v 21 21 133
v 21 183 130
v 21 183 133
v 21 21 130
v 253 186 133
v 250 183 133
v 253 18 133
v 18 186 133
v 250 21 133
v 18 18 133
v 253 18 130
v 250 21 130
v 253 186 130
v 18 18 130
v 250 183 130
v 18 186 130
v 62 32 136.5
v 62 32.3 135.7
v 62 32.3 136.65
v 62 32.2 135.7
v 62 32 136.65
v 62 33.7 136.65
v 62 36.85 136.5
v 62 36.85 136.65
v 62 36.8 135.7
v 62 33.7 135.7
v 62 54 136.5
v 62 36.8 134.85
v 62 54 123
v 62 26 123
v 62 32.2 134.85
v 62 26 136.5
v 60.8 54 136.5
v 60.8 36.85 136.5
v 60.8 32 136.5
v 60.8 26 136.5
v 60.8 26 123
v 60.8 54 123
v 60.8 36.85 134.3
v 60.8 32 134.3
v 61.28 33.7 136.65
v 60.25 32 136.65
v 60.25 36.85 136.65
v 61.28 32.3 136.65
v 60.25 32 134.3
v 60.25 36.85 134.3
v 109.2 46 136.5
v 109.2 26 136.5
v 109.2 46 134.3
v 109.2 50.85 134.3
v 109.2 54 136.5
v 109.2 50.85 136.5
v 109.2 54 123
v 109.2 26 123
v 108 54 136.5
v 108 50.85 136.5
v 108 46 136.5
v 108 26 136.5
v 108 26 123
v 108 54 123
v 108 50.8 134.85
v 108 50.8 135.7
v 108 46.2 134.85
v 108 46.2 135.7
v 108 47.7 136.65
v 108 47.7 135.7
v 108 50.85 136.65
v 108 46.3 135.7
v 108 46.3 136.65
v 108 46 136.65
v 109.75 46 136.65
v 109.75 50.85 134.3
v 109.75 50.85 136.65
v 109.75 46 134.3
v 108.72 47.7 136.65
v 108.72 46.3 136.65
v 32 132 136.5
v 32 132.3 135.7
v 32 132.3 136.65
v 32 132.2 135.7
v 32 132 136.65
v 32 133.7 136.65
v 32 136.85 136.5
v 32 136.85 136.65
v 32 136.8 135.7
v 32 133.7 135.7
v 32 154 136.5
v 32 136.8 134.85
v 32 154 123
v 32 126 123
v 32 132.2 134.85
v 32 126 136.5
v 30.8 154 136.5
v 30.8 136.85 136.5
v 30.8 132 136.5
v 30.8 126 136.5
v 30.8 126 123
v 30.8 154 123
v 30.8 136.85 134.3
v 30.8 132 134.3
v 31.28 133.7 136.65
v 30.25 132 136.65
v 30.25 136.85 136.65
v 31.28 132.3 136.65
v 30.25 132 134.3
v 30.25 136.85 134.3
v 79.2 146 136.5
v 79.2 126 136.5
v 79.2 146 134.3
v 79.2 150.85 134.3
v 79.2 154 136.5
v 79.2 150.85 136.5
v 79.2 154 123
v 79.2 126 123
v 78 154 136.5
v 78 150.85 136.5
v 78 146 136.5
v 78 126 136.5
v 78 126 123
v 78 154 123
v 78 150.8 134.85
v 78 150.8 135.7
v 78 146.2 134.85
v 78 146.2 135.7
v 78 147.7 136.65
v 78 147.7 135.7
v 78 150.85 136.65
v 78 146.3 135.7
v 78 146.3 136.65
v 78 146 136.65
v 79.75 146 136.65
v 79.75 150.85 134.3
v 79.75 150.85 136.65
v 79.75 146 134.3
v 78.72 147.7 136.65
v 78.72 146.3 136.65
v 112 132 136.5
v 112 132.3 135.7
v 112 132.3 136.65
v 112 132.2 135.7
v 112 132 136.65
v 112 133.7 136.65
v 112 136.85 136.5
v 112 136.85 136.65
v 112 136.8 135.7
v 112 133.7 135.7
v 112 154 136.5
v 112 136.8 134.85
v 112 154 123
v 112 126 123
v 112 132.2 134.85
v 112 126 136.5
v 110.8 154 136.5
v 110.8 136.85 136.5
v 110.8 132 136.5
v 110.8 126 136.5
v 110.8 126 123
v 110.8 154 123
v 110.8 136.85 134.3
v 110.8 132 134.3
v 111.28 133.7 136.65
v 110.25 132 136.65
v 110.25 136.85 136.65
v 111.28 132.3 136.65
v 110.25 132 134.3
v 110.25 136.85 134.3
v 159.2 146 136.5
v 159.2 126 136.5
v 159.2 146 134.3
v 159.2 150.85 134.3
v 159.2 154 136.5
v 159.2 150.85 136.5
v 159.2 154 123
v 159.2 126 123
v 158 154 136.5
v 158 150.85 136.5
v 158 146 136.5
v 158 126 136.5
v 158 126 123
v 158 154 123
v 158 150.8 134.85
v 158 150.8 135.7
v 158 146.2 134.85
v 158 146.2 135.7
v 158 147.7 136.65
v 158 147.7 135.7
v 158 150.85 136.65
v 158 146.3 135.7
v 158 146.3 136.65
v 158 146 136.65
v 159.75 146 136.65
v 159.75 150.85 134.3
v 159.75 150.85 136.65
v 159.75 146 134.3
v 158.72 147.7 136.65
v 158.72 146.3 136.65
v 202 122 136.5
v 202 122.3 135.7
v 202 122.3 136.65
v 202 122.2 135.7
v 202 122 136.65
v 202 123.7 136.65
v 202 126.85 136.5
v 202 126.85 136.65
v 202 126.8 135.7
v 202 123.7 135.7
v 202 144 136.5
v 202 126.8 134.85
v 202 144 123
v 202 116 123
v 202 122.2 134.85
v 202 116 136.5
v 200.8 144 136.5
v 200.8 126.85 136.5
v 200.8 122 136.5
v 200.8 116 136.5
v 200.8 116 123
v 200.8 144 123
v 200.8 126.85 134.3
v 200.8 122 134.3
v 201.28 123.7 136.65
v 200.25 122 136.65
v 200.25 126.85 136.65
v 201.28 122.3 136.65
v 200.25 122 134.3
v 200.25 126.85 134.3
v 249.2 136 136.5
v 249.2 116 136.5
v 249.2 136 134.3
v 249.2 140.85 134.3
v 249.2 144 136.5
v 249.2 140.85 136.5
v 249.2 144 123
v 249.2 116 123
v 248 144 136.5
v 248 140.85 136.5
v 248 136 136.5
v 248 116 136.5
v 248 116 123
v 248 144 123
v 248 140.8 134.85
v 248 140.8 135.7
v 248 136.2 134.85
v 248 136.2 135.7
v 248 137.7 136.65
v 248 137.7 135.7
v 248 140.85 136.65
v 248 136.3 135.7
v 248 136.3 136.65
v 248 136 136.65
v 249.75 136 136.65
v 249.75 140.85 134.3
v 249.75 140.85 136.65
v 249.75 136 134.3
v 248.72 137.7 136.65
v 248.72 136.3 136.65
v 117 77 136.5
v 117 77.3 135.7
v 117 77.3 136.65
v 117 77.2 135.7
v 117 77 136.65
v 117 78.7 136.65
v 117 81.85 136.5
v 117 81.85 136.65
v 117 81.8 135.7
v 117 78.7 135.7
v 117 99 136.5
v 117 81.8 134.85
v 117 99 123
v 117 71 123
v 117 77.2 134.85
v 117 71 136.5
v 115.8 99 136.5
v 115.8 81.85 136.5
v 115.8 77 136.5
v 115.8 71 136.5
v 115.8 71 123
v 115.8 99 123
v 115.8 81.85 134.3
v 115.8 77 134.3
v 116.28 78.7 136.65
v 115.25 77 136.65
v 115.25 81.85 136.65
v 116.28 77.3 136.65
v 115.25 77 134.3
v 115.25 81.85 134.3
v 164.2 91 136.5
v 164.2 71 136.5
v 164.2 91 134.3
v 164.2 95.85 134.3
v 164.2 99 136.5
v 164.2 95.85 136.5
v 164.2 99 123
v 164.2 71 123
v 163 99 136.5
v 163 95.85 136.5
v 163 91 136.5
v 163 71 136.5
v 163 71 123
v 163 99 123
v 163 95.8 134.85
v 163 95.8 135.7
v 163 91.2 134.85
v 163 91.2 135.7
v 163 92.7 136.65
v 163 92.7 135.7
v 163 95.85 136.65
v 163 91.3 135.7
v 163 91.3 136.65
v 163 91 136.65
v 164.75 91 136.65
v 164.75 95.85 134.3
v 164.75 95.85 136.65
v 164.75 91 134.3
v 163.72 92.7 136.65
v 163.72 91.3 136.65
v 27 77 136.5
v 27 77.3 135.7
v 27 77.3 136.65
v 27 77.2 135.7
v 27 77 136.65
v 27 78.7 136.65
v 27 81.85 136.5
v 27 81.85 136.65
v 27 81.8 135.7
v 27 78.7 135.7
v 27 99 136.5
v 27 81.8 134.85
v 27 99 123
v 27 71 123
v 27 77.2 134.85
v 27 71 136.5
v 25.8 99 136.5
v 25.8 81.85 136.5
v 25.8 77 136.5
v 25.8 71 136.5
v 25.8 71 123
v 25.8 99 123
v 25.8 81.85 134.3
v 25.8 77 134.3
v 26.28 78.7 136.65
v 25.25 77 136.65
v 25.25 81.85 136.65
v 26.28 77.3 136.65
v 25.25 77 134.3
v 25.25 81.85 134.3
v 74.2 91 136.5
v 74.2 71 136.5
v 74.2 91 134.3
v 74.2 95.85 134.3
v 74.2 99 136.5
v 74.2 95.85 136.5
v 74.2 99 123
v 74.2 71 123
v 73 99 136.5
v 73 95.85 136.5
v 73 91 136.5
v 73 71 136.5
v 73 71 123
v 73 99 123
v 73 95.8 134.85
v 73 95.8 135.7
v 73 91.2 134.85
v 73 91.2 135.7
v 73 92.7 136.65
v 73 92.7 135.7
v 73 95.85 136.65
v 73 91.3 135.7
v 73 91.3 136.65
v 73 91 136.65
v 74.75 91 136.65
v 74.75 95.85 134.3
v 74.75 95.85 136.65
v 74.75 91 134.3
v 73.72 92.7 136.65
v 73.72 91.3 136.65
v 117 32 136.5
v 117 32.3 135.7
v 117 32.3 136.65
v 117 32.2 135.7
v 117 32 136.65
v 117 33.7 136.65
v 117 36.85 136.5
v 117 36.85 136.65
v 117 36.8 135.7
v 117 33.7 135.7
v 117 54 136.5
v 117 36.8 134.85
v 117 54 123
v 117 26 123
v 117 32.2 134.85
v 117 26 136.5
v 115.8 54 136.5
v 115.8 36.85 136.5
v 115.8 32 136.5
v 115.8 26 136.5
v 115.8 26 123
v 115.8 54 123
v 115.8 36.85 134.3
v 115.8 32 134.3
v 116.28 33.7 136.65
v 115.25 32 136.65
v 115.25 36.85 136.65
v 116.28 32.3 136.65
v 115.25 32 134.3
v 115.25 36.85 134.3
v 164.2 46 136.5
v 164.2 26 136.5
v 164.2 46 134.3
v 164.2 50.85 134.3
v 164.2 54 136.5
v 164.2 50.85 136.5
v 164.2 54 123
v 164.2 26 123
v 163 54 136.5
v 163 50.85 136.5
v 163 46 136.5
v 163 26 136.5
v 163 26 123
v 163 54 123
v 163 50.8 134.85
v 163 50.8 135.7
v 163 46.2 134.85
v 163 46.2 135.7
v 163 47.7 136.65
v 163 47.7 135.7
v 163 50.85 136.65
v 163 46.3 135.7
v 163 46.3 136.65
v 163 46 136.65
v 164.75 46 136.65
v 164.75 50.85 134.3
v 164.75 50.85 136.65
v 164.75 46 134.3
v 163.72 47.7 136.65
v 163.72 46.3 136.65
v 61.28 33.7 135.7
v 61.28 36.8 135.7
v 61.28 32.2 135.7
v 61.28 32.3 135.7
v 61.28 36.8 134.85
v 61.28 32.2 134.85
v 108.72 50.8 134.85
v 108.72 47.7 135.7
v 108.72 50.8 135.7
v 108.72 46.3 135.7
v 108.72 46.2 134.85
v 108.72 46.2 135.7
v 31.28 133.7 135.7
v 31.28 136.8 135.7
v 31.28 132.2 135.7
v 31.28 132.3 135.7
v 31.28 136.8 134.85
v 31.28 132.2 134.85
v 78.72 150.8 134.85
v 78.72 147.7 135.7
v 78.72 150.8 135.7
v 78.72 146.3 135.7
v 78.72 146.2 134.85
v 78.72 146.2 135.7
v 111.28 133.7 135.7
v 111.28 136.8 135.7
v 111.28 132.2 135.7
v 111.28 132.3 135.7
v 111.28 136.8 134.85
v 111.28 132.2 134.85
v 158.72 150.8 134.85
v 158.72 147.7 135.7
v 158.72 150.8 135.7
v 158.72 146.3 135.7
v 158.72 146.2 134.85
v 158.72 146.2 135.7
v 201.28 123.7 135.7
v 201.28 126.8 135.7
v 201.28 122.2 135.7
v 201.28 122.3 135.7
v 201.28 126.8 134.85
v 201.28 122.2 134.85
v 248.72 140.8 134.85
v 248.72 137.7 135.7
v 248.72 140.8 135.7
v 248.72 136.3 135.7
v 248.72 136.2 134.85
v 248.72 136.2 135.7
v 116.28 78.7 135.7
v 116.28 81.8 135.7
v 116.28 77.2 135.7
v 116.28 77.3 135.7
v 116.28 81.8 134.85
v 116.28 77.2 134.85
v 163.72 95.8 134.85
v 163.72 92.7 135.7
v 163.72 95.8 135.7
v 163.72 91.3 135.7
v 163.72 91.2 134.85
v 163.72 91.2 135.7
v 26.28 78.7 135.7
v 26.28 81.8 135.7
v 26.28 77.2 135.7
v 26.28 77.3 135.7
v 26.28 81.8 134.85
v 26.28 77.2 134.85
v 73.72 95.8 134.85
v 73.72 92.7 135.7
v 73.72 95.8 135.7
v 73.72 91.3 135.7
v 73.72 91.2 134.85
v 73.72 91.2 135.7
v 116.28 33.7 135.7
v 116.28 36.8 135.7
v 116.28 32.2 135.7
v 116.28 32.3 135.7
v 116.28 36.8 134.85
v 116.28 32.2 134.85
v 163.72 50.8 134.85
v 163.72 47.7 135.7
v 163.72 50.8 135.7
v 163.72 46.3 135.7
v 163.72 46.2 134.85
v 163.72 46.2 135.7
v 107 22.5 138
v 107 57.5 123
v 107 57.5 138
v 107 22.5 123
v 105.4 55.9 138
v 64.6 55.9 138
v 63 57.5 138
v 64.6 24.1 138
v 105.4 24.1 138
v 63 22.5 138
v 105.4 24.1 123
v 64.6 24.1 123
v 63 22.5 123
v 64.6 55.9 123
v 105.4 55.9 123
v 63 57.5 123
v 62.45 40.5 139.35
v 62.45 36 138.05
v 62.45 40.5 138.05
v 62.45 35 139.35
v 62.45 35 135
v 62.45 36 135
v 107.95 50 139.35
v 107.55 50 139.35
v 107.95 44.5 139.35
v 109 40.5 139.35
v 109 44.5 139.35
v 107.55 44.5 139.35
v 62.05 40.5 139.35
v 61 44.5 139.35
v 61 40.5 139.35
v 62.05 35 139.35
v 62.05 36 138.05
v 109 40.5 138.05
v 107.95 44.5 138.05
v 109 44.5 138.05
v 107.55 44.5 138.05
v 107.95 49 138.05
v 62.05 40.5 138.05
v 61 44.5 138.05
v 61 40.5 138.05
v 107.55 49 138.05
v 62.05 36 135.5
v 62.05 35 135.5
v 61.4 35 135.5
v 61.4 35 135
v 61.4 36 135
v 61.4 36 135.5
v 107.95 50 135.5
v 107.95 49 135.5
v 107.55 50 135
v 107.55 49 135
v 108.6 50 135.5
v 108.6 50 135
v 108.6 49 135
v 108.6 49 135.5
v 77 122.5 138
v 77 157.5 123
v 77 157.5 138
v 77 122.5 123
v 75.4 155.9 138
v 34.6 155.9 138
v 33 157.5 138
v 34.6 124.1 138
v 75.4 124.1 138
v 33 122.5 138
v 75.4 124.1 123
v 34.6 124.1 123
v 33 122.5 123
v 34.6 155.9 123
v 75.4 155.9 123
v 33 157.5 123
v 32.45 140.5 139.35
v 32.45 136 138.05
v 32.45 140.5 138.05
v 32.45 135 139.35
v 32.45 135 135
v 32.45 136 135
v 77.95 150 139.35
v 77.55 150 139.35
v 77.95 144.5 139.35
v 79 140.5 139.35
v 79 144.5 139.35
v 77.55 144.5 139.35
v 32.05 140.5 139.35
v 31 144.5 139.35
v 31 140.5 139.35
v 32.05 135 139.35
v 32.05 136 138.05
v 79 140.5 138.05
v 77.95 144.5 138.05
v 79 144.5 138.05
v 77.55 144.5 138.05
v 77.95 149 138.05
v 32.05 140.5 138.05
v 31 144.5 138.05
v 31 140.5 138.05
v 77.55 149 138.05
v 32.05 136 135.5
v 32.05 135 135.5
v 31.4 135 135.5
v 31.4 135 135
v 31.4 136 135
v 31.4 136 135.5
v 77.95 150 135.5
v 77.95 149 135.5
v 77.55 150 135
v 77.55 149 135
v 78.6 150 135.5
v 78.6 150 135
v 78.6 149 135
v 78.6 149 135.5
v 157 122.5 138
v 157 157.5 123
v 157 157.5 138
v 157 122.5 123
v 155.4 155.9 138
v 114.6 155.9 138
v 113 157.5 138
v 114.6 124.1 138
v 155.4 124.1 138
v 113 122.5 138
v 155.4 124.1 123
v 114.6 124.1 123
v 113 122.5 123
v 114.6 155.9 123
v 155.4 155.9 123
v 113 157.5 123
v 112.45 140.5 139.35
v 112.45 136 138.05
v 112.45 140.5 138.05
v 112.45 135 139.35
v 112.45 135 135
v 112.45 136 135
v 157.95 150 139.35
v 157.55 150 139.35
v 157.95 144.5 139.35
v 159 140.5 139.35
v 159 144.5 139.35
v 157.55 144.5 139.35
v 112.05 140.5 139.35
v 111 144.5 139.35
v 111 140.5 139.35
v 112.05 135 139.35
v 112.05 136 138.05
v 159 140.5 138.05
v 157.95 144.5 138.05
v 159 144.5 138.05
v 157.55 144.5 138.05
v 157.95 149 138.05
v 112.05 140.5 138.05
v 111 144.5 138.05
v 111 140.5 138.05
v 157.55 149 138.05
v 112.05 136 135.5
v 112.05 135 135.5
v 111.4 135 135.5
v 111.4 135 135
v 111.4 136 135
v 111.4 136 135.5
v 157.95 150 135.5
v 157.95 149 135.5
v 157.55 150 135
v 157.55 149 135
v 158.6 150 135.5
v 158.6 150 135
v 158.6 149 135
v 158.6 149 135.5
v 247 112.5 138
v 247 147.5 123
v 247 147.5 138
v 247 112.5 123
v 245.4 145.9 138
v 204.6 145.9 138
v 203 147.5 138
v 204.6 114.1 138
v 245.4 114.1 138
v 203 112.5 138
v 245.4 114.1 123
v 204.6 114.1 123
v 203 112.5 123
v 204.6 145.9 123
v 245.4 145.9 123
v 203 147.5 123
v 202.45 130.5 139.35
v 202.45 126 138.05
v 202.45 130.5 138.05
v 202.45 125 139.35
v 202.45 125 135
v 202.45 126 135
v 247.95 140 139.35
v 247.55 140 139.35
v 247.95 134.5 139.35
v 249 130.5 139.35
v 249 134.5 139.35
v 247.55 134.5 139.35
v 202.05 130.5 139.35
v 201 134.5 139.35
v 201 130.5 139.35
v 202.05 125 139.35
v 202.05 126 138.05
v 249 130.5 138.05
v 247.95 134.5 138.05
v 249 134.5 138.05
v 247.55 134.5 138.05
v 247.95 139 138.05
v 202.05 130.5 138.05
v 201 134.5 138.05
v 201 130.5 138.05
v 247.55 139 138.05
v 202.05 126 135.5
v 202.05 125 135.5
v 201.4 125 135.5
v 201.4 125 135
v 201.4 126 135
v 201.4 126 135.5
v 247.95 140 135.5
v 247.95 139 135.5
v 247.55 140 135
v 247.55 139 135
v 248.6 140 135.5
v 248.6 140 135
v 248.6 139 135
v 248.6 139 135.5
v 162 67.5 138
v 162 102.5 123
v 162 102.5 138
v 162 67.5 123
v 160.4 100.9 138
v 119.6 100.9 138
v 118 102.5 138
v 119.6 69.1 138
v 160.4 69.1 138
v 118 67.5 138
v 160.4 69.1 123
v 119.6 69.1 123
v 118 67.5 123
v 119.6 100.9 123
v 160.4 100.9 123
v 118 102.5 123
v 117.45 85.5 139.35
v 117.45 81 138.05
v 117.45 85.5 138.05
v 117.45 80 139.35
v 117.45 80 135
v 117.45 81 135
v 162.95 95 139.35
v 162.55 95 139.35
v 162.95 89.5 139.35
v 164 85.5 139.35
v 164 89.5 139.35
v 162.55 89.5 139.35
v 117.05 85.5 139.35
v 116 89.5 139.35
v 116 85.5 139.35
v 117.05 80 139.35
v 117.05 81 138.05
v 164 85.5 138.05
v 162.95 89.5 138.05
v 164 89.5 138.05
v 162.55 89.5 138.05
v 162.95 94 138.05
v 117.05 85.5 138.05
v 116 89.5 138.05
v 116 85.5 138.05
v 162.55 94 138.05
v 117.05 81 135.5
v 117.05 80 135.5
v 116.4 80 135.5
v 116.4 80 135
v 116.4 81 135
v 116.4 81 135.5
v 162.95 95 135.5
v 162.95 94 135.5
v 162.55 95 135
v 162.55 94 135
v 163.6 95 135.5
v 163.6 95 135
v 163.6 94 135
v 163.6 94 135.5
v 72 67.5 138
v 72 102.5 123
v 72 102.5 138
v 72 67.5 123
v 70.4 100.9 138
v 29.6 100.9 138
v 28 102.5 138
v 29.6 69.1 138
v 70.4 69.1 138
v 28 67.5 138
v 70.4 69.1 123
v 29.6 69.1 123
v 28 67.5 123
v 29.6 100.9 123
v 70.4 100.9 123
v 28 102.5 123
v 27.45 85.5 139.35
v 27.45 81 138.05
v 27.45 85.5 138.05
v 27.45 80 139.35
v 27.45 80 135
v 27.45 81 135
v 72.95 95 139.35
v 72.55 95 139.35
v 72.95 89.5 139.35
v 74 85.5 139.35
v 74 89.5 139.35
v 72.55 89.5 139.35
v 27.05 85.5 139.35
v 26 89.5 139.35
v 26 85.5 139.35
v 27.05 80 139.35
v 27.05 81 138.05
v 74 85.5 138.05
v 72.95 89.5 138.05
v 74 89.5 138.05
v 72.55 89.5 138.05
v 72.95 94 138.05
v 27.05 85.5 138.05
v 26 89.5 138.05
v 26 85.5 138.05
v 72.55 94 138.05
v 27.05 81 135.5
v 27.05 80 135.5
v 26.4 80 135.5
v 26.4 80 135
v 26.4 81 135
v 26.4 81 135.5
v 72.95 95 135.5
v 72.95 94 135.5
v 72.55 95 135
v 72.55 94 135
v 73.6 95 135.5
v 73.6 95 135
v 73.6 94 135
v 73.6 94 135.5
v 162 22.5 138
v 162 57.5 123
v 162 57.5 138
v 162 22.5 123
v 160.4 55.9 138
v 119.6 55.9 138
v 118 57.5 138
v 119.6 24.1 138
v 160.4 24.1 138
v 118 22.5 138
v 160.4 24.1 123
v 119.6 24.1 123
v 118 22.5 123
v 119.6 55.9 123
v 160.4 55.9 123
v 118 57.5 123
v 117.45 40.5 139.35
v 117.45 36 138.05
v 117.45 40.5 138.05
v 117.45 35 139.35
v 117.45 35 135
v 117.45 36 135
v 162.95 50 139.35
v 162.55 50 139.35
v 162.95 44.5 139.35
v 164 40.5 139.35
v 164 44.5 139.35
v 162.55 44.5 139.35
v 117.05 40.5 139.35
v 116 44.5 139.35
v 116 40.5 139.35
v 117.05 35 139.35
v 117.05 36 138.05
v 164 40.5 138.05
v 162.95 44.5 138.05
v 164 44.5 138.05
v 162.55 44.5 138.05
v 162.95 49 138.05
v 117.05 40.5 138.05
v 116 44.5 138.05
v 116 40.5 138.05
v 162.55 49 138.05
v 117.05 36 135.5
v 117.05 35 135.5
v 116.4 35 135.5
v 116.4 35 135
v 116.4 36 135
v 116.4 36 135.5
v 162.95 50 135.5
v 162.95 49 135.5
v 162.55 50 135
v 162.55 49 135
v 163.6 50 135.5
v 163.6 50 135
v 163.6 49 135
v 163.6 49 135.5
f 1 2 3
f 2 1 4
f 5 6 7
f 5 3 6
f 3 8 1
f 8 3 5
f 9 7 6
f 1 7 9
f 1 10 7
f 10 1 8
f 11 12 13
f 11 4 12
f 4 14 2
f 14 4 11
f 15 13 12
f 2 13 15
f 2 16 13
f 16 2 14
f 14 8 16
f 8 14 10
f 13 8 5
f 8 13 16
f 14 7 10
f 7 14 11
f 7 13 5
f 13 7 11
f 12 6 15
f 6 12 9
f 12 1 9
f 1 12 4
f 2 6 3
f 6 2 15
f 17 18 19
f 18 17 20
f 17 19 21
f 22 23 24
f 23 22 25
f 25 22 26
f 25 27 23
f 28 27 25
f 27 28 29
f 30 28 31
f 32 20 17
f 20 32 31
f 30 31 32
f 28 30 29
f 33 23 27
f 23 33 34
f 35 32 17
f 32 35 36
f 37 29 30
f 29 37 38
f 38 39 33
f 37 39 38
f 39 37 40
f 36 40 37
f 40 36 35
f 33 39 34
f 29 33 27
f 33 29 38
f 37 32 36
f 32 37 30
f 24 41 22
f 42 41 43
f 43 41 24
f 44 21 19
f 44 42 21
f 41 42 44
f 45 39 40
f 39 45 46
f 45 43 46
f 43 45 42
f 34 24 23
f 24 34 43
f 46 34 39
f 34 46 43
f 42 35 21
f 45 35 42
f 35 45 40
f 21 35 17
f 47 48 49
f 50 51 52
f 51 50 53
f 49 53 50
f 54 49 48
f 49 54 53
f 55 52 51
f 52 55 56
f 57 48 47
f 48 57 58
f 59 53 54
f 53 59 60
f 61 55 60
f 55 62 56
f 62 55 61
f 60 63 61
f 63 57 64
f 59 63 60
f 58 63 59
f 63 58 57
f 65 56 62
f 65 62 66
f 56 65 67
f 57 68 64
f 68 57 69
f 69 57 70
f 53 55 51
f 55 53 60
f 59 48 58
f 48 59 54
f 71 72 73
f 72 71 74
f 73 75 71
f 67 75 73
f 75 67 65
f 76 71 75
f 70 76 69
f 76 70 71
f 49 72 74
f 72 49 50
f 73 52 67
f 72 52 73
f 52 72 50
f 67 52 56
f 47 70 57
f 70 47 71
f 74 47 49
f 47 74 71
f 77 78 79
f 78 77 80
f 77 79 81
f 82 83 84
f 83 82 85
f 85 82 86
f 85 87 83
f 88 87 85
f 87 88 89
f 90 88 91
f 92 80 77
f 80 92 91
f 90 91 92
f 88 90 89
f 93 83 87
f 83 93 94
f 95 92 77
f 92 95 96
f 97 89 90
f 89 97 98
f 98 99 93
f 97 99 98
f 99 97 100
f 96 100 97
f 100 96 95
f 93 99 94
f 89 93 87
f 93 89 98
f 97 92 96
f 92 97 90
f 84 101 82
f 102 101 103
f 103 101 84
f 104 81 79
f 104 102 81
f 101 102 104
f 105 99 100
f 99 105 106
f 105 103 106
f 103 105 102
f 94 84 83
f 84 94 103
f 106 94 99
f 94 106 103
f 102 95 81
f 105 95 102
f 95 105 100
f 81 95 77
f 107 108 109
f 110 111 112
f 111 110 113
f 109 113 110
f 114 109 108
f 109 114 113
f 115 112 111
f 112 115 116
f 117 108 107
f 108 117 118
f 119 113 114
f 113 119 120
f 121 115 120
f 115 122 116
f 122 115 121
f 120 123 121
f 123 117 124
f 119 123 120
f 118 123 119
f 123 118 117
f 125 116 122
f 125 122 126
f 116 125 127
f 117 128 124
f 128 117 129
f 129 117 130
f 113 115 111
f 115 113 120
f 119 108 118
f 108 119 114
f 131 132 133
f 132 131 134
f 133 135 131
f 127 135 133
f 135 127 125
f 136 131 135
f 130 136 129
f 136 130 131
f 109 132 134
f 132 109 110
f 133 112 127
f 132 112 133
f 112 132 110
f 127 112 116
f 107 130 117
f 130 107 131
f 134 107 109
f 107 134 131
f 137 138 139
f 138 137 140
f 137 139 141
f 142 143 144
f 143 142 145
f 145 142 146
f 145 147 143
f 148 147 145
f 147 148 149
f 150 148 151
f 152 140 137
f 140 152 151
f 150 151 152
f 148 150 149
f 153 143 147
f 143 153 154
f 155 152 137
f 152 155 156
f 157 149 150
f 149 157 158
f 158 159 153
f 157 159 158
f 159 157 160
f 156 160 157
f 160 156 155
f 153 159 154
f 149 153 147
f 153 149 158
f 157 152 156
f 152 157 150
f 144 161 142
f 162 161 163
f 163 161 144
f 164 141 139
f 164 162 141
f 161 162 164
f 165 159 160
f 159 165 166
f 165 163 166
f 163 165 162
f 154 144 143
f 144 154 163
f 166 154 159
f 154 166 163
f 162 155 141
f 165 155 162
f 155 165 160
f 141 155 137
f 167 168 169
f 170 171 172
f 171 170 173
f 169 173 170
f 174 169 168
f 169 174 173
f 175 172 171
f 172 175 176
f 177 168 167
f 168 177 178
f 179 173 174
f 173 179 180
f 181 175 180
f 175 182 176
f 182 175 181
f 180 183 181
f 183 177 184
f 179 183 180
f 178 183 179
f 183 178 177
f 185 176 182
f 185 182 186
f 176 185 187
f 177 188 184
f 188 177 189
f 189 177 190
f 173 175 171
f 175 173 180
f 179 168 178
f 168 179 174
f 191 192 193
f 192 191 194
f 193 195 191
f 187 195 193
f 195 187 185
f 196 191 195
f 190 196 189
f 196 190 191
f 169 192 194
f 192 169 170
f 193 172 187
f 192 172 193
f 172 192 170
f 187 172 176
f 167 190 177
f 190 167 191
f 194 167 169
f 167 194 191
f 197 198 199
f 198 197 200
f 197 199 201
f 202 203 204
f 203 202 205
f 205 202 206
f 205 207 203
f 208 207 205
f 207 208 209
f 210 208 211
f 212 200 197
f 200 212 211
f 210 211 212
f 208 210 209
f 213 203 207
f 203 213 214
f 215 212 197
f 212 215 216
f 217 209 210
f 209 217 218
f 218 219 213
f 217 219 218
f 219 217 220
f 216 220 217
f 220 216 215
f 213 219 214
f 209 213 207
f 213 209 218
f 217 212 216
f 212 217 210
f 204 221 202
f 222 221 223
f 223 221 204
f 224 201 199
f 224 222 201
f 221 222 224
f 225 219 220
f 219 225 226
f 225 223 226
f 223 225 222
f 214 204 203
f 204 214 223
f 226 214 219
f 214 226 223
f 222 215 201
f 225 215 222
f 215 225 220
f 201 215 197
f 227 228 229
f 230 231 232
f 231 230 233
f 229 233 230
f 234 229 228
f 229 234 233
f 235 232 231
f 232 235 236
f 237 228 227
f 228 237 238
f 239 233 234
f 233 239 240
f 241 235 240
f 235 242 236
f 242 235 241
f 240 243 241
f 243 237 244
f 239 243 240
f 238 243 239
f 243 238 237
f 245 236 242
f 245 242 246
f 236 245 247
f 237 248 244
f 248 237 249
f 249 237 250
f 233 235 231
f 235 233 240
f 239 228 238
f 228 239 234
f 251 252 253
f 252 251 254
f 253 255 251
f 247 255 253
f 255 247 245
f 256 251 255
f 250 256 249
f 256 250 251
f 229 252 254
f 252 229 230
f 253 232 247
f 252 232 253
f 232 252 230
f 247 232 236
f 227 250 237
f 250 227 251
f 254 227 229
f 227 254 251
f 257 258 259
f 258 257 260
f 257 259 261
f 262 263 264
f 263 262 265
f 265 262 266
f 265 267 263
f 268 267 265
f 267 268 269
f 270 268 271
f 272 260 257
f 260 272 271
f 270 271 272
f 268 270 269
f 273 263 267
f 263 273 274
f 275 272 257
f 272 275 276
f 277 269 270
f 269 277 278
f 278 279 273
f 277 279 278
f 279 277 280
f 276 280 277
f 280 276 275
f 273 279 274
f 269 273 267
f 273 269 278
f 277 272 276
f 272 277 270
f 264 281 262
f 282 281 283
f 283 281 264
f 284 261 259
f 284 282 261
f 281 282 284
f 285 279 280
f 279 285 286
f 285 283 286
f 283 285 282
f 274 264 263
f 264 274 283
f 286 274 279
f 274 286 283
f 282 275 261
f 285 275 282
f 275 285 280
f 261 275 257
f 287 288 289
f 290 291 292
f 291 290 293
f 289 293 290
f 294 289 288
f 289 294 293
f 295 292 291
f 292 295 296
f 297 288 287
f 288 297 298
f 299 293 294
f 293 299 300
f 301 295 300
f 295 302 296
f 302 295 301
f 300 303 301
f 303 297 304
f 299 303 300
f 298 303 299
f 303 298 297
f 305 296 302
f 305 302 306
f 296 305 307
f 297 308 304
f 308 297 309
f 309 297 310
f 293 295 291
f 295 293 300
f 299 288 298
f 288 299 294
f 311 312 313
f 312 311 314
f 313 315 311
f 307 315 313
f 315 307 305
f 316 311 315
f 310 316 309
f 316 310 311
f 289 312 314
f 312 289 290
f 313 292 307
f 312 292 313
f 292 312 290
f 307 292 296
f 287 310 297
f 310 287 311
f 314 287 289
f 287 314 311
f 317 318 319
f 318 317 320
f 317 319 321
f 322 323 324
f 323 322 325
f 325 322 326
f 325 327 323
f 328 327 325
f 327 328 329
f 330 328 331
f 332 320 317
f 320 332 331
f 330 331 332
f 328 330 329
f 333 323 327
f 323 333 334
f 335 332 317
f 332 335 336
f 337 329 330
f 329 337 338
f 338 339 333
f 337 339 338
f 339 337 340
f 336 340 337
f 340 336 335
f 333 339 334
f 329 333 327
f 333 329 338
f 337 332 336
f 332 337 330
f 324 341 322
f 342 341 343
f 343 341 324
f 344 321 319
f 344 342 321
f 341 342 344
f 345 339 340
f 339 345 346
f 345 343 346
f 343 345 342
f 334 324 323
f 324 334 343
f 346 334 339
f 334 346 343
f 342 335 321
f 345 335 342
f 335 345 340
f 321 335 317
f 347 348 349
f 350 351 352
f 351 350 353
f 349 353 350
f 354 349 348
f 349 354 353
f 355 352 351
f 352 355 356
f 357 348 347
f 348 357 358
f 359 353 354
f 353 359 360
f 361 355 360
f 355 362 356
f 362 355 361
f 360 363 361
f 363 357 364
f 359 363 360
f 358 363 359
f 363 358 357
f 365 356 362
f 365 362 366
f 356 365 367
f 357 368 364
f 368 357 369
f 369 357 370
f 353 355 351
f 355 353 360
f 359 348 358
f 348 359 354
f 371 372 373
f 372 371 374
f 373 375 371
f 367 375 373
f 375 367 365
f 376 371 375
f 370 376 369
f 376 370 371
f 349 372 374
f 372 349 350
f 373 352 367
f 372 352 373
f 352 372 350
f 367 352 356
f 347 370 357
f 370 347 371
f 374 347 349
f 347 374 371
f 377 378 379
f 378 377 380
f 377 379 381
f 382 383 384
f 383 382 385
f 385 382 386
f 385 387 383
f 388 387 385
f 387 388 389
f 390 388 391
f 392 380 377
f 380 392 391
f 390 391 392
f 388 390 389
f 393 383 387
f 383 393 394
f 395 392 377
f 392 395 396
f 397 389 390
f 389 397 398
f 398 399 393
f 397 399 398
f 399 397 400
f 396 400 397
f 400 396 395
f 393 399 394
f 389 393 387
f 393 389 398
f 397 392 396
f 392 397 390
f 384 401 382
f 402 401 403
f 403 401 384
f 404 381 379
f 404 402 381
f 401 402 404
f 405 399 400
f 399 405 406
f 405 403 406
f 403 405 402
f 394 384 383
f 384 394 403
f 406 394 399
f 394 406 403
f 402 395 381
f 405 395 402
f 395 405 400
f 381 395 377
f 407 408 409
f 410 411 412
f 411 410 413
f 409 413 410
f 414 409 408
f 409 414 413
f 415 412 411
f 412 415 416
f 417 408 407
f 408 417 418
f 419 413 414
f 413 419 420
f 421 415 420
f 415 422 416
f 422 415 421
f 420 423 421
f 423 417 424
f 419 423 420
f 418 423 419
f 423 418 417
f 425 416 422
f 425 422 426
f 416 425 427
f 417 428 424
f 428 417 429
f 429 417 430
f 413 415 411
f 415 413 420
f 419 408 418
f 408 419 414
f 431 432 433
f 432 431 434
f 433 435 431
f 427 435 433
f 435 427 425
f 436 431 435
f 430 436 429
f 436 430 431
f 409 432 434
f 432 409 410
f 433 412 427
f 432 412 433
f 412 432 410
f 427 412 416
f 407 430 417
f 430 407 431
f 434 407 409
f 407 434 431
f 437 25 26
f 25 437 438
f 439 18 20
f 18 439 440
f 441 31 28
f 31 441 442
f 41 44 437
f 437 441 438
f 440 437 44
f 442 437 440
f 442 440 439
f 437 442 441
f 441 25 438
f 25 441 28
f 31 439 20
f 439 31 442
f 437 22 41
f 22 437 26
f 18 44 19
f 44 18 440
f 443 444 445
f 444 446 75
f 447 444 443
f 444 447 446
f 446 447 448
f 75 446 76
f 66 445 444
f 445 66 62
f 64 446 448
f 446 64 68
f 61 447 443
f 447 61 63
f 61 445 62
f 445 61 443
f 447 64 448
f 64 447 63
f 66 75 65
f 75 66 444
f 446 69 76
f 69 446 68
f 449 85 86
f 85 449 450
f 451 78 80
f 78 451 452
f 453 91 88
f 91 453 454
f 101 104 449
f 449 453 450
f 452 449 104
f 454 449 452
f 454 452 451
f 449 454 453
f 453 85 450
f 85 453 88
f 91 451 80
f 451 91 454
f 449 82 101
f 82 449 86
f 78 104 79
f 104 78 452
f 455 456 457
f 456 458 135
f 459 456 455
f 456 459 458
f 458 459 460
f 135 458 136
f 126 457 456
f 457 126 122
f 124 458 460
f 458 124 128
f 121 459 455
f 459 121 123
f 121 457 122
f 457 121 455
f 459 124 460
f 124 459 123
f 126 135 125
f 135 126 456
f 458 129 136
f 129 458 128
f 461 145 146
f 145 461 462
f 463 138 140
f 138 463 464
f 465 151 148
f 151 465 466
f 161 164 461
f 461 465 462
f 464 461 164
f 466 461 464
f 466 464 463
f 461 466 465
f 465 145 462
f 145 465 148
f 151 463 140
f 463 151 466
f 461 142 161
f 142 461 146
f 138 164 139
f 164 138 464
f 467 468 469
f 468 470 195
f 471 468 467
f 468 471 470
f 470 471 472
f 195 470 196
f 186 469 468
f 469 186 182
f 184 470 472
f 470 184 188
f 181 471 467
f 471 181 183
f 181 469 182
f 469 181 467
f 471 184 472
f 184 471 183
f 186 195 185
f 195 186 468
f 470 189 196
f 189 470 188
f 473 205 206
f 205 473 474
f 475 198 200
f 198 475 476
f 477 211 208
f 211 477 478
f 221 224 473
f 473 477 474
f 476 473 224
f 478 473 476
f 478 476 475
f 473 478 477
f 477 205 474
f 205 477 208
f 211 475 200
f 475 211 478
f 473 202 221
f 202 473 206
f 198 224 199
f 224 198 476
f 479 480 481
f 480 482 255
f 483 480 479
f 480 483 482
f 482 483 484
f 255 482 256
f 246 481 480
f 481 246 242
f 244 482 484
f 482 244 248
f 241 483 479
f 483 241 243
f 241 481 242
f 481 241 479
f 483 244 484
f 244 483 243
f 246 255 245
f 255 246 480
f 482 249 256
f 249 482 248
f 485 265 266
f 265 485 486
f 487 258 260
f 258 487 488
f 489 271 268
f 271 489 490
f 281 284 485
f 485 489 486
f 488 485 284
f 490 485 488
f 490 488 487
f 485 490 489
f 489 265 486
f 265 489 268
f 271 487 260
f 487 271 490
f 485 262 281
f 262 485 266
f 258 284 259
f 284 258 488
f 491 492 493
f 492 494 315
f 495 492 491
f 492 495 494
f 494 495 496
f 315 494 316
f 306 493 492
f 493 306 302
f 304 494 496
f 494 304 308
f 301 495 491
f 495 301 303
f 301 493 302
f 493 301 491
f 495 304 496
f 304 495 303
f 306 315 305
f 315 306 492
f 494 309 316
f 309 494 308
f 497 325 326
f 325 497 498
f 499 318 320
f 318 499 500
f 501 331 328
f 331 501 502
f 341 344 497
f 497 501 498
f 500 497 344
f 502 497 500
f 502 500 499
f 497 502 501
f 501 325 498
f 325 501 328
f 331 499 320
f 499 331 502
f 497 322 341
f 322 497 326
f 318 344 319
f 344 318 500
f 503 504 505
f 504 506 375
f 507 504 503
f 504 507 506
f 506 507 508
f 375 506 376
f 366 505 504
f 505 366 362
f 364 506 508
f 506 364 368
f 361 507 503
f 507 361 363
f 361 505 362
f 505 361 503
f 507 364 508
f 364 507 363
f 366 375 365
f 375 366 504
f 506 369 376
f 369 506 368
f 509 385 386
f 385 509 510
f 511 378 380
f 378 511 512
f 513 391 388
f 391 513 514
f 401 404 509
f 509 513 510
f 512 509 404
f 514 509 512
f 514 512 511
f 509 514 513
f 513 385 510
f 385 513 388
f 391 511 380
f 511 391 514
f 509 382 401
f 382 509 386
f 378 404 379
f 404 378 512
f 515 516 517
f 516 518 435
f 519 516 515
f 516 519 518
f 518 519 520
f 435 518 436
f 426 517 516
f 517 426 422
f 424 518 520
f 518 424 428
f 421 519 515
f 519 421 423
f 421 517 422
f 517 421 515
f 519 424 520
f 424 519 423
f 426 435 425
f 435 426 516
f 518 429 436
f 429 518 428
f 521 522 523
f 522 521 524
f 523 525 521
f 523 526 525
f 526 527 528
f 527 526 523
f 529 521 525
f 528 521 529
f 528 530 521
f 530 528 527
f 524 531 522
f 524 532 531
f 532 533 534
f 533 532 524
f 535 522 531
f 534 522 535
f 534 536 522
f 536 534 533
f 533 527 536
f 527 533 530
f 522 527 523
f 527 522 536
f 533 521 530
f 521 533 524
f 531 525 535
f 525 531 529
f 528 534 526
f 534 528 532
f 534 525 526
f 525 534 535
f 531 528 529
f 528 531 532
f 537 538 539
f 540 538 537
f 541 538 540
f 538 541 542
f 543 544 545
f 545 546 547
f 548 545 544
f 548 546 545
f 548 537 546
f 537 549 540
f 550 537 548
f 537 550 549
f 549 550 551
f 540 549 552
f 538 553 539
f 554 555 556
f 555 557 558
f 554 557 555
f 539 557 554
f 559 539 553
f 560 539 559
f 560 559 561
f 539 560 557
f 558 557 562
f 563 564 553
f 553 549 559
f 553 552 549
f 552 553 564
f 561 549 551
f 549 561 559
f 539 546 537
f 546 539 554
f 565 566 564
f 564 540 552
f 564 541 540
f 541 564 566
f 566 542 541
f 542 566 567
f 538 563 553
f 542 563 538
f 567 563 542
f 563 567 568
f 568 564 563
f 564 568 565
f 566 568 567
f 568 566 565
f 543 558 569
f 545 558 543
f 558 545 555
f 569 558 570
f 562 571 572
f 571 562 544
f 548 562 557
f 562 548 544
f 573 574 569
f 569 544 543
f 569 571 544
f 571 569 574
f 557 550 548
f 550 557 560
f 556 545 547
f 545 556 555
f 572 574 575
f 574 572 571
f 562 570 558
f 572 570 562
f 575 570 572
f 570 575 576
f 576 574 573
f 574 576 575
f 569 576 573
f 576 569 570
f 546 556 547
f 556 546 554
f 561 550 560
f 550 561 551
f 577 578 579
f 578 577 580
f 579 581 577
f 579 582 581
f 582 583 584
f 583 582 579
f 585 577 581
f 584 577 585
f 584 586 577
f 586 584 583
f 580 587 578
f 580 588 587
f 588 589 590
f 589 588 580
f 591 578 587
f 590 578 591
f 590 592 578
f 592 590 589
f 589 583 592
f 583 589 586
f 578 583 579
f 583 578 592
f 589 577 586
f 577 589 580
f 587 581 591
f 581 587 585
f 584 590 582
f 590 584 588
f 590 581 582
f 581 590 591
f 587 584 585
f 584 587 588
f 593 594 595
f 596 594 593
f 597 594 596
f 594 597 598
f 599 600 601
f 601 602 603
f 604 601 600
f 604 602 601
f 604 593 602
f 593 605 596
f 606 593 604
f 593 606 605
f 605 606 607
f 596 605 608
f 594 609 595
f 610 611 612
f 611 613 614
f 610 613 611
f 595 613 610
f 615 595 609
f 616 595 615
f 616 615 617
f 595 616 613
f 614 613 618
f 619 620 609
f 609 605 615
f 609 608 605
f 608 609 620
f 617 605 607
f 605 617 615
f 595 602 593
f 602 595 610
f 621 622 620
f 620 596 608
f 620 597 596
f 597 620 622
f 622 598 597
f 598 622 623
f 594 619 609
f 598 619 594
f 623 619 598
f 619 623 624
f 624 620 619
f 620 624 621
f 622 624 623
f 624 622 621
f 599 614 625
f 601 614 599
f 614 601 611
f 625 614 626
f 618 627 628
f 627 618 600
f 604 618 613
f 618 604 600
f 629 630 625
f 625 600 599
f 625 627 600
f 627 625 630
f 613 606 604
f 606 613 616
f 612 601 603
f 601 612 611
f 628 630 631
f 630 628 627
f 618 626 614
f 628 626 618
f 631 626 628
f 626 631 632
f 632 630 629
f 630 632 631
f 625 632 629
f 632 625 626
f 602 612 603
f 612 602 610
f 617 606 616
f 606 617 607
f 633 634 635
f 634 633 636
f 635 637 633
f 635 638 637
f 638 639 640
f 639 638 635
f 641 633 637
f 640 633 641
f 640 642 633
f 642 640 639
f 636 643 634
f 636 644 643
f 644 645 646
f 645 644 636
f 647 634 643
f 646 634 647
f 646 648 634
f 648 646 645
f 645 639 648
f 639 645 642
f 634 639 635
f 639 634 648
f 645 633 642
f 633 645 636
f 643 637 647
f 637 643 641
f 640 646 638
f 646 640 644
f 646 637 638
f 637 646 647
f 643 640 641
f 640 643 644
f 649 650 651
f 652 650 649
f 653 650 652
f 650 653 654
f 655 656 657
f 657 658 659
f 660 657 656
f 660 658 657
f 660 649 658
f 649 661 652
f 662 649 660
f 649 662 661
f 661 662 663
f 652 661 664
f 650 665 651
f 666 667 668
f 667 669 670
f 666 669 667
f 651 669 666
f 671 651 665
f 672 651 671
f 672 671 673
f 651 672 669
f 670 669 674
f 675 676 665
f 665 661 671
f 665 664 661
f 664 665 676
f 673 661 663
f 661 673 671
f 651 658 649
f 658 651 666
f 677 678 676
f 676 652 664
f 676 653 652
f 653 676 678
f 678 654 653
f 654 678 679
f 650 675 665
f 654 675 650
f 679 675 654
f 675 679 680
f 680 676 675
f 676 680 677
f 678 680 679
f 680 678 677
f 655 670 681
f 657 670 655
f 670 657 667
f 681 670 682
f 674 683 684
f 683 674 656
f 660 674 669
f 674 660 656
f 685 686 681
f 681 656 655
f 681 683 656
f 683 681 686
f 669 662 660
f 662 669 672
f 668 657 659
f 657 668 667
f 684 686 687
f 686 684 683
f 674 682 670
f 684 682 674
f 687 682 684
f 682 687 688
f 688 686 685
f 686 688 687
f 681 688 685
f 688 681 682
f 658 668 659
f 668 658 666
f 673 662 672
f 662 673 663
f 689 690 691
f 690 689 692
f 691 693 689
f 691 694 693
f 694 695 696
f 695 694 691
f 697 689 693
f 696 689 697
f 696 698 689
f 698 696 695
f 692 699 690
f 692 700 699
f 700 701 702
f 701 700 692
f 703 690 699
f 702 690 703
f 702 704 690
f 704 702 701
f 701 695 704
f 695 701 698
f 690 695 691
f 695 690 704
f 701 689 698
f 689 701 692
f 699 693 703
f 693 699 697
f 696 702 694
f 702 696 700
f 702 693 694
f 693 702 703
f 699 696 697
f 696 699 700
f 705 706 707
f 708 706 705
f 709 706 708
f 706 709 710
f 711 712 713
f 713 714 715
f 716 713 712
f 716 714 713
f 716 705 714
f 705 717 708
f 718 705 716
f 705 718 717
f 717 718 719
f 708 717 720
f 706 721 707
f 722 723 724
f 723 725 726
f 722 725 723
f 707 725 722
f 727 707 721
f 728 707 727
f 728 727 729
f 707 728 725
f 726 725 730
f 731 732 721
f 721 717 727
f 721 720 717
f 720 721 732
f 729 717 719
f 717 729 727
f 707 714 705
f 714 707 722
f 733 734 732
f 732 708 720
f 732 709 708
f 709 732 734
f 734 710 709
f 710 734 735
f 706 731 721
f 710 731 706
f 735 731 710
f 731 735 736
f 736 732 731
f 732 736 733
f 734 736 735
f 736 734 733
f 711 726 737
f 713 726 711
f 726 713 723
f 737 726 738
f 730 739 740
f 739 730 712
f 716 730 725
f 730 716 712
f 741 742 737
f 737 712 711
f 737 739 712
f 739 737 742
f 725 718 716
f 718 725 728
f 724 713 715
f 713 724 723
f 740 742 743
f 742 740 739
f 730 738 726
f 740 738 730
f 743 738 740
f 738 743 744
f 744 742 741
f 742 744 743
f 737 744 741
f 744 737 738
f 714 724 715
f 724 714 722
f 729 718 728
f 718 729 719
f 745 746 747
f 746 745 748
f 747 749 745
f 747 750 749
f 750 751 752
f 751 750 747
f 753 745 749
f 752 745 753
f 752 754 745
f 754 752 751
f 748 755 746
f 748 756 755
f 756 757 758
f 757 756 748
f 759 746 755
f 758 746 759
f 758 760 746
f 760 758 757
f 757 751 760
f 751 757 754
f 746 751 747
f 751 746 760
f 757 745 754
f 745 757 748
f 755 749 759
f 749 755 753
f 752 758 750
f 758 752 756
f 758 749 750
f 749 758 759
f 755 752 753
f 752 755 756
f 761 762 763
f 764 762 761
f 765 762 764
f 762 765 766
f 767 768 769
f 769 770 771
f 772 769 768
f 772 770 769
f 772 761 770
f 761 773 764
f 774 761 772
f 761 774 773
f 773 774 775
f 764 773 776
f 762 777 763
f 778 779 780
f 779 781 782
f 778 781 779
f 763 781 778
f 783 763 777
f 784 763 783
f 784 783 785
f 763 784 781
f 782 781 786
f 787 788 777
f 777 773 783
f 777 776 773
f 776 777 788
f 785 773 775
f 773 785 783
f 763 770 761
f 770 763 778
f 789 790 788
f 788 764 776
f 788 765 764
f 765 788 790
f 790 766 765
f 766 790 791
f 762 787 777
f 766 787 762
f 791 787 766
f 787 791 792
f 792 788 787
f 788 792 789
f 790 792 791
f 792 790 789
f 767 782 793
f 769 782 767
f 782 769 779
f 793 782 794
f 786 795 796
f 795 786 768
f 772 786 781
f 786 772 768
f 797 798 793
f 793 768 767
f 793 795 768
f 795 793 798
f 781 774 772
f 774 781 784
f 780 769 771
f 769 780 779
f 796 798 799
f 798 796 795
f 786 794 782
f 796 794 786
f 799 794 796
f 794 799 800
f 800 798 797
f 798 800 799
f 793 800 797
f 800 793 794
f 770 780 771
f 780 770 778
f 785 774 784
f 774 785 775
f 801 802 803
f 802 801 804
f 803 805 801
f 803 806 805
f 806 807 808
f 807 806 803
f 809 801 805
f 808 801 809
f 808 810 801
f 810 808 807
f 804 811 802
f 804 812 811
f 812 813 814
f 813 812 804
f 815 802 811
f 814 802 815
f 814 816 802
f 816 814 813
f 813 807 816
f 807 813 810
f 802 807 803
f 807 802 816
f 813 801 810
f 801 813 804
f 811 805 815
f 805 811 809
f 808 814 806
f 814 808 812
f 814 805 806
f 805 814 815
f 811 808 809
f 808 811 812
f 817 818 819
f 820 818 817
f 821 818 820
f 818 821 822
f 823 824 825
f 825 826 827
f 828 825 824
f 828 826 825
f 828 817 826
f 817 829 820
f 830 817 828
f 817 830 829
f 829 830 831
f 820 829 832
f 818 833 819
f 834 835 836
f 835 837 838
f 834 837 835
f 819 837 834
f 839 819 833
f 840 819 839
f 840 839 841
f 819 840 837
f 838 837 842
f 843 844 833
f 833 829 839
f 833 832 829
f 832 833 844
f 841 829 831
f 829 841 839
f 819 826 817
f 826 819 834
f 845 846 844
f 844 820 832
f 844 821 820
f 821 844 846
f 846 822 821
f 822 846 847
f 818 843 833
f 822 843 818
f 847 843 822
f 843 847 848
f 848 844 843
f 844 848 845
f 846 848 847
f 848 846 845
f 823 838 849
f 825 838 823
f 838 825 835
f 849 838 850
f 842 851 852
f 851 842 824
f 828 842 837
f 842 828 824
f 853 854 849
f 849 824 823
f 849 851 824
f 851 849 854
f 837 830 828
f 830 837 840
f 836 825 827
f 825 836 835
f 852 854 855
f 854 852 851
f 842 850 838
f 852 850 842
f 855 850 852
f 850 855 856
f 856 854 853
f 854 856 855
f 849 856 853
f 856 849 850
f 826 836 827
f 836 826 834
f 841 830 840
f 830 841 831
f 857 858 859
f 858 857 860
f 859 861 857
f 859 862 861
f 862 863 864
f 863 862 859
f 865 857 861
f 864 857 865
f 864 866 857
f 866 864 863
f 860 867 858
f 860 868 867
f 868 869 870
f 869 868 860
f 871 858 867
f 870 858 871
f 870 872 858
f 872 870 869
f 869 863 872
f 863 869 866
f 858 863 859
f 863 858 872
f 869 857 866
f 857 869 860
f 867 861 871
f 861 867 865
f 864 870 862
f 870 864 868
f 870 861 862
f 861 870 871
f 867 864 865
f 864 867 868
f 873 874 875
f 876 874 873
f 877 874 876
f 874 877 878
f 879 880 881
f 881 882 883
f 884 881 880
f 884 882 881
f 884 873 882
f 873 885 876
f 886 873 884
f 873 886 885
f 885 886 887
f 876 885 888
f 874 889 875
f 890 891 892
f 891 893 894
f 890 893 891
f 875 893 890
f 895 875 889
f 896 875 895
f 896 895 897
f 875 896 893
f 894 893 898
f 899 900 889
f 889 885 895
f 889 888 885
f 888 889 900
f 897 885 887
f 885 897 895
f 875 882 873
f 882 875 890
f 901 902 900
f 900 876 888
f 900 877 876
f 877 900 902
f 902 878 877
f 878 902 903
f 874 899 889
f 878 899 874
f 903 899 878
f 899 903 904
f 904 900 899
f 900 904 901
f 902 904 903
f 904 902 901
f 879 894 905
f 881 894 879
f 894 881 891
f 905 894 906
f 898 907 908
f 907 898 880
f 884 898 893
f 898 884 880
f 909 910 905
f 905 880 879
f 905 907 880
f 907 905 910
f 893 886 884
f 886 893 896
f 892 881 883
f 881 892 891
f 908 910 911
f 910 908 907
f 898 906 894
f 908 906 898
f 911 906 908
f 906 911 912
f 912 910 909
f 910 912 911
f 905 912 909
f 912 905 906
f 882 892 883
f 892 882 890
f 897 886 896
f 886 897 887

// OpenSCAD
// D7 seven-axis nominal matched guide/rigid-bayonet proof of concept.
// DESIGN REVIEW, NOT APPROVED HARDWARE. 14 guide lips, 14 keys.
// Does NOT include independently load-certified bracket anchors, other D7 solids, real motor PCBs or 14 webs.
// Source 1774 solid SHA256 20ee6d8c001ee16d64e47edb5456eff3bc39f3390a85dd94b69b7eb1504d878f.
// Lock state: "entry" for insertion, "locked" after +Y2.5mm. REVERSE UNINTENDED SLIDE STILL UNBLOCKED.
$fn=24;lock_state="locked";show_sleds=true;
function lock_y()=lock_state=="locked"?2.5:0;
module fixed_ring(){color([.10,.22,.45,.8]){
  translate([18,18,130])cube([3,168,3]);
  translate([250,18,130])cube([3,168,3]);
  translate([18,18,130])cube([235,3,3]);
  translate([18,183,130])cube([235,3,3]);}}
module all_notched_guides(){difference(){
  union(){
    // Axis G1, left and right guide plus thickening boss
    translate([60.8,26,123])cube([1.2,28,13.5]);
    translate([60.25,32,134.3])cube([1.75,4.85,2.35]);
    translate([108,26,123])cube([1.2,28,13.5]);
    translate([108,46,134.3])cube([1.75,4.85,2.35]);
    // Axis G2, left and right guide plus thickening boss
    translate([30.8,126,123])cube([1.2,28,13.5]);
    translate([30.25,132,134.3])cube([1.75,4.85,2.35]);
    translate([78,126,123])cube([1.2,28,13.5]);
    translate([78,146,134.3])cube([1.75,4.85,2.35]);
    // Axis G3, left and right guide plus thickening boss
    translate([110.8,126,123])cube([1.2,28,13.5]);
    translate([110.25,132,134.3])cube([1.75,4.85,2.35]);
    translate([158,126,123])cube([1.2,28,13.5]);
    translate([158,146,134.3])cube([1.75,4.85,2.35]);
    // Axis G4, left and right guide plus thickening boss
    translate([200.8,116,123])cube([1.2,28,13.5]);
    translate([200.25,122,134.3])cube([1.75,4.85,2.35]);
    translate([248,116,123])cube([1.2,28,13.5]);
    translate([248,136,134.3])cube([1.75,4.85,2.35]);
    // Axis G5, left and right guide plus thickening boss
    translate([115.8,71,123])cube([1.2,28,13.5]);
    translate([115.25,77,134.3])cube([1.75,4.85,2.35]);
    translate([163,71,123])cube([1.2,28,13.5]);
    translate([163,91,134.3])cube([1.75,4.85,2.35]);
    // Axis G6, left and right guide plus thickening boss
    translate([25.8,71,123])cube([1.2,28,13.5]);
    translate([25.25,77,134.3])cube([1.75,4.85,2.35]);
    translate([73,71,123])cube([1.2,28,13.5]);
    translate([73,91,134.3])cube([1.75,4.85,2.35]);
    // Axis G7, left and right guide plus thickening boss
    translate([115.8,26,123])cube([1.2,28,13.5]);
    translate([115.25,32,134.3])cube([1.75,4.85,2.35]);
    translate([163,26,123])cube([1.2,28,13.5]);
    translate([163,46,134.3])cube([1.75,4.85,2.35]);
  }
  translate([61.28,32.20,134.85])cube([.87,4.6,.85]); // lower G1L keyway
  translate([61.28,32.30,135.7])cube([.87,1.4,1.05]); // top ENTRY aperture
  translate([107.85,46.20,134.85])cube([.87,4.6,.85]); // lower G1R keyway
  translate([107.85,46.30,135.7])cube([.87,1.4,1.05]); // top ENTRY aperture
  translate([31.28,132.20,134.85])cube([.87,4.6,.85]); // lower G2L keyway
  translate([31.28,132.30,135.7])cube([.87,1.4,1.05]); // top ENTRY aperture
  translate([77.85,146.20,134.85])cube([.87,4.6,.85]); // lower G2R keyway
  translate([77.85,146.30,135.7])cube([.87,1.4,1.05]); // top ENTRY aperture
  translate([111.28,132.20,134.85])cube([.87,4.6,.85]); // lower G3L keyway
  translate([111.28,132.30,135.7])cube([.87,1.4,1.05]); // top ENTRY aperture
  translate([157.85,146.20,134.85])cube([.87,4.6,.85]); // lower G3R keyway
  translate([157.85,146.30,135.7])cube([.87,1.4,1.05]); // top ENTRY aperture
  translate([201.28,122.20,134.85])cube([.87,4.6,.85]); // lower G4L keyway
  translate([201.28,122.30,135.7])cube([.87,1.4,1.05]); // top ENTRY aperture
  translate([247.85,136.20,134.85])cube([.87,4.6,.85]); // lower G4R keyway
  translate([247.85,136.30,135.7])cube([.87,1.4,1.05]); // top ENTRY aperture
  translate([116.28,77.20,134.85])cube([.87,4.6,.85]); // lower G5L keyway
  translate([116.28,77.30,135.7])cube([.87,1.4,1.05]); // top ENTRY aperture
  translate([162.85,91.20,134.85])cube([.87,4.6,.85]); // lower G5R keyway
  translate([162.85,91.30,135.7])cube([.87,1.4,1.05]); // top ENTRY aperture
  translate([26.28,77.20,134.85])cube([.87,4.6,.85]); // lower G6L keyway
  translate([26.28,77.30,135.7])cube([.87,1.4,1.05]); // top ENTRY aperture
  translate([72.85,91.20,134.85])cube([.87,4.6,.85]); // lower G6R keyway
  translate([72.85,91.30,135.7])cube([.87,1.4,1.05]); // top ENTRY aperture
  translate([116.28,32.20,134.85])cube([.87,4.6,.85]); // lower G7L keyway
  translate([116.28,32.30,135.7])cube([.87,1.4,1.05]); // top ENTRY aperture
  translate([162.85,46.20,134.85])cube([.87,4.6,.85]); // lower G7R keyway
  translate([162.85,46.30,135.7])cube([.87,1.4,1.05]); // top ENTRY aperture
}}
module sled(x,y){color([.45,.73,.2,.8])translate([x-22,y-17.5,123])difference(){
  cube([44,35,15]);translate([1.6,1.6,-.3])cube([40.8,31.8,15.6]);}}
module bar(axis,x,y){ color([.7,.25,.7,.8])translate([0,lock_y(),0])union(){
  translate([x-24,y-2,138.05])cube([48,4,1.3]);
  if(axis==1){
    translate([62.05,32.5,138.05])cube([.4,5.500,1.3]);
    translate([62.05,32.5,135])cube([.4,1,4.35]);
    translate([61.4,32.5,135])cube([1.05,1,.5]);
    translate([107.55,42,138.05])cube([.4,5.500,1.3]);
    translate([107.55,46.5,135])cube([.4,1,4.35]);
    translate([107.55,46.5,135])cube([1.05,1,.5]);
  }
  if(axis==2){
    translate([32.05,132.5,138.05])cube([.4,5.500,1.3]);
    translate([32.05,132.5,135])cube([.4,1,4.35]);
    translate([31.4,132.5,135])cube([1.05,1,.5]);
    translate([77.55,142,138.05])cube([.4,5.500,1.3]);
    translate([77.55,146.5,135])cube([.4,1,4.35]);
    translate([77.55,146.5,135])cube([1.05,1,.5]);
  }
  if(axis==3){
    translate([112.05,132.5,138.05])cube([.4,5.500,1.3]);
    translate([112.05,132.5,135])cube([.4,1,4.35]);
    translate([111.4,132.5,135])cube([1.05,1,.5]);
    translate([157.55,142,138.05])cube([.4,5.500,1.3]);
    translate([157.55,146.5,135])cube([.4,1,4.35]);
    translate([157.55,146.5,135])cube([1.05,1,.5]);
  }
  if(axis==4){
    translate([202.05,122.5,138.05])cube([.4,5.500,1.3]);
    translate([202.05,122.5,135])cube([.4,1,4.35]);
    translate([201.4,122.5,135])cube([1.05,1,.5]);
    translate([247.55,132,138.05])cube([.4,5.500,1.3]);
    translate([247.55,136.5,135])cube([.4,1,4.35]);
    translate([247.55,136.5,135])cube([1.05,1,.5]);
  }
  if(axis==5){
    translate([117.05,77.5,138.05])cube([.4,5.500,1.3]);
    translate([117.05,77.5,135])cube([.4,1,4.35]);
    translate([116.4,77.5,135])cube([1.05,1,.5]);
    translate([162.55,87,138.05])cube([.4,5.500,1.3]);
    translate([162.55,91.5,135])cube([.4,1,4.35]);
    translate([162.55,91.5,135])cube([1.05,1,.5]);
  }
  if(axis==6){
    translate([27.05,77.5,138.05])cube([.4,5.500,1.3]);
    translate([27.05,77.5,135])cube([.4,1,4.35]);
    translate([26.4,77.5,135])cube([1.05,1,.5]);
    translate([72.55,87,138.05])cube([.4,5.500,1.3]);
    translate([72.55,91.5,135])cube([.4,1,4.35]);
    translate([72.55,91.5,135])cube([1.05,1,.5]);
  }
  if(axis==7){
    translate([117.05,32.5,138.05])cube([.4,5.500,1.3]);
    translate([117.05,32.5,135])cube([.4,1,4.35]);
    translate([116.4,32.5,135])cube([1.05,1,.5]);
    translate([162.55,42,138.05])cube([.4,5.500,1.3]);
    translate([162.55,46.5,135])cube([.4,1,4.35]);
    translate([162.55,46.5,135])cube([1.05,1,.5]);
  }
}}
fixed_ring();
color([.06,.50,.55])all_notched_guides();
if(show_sleds)sled(85,40);
bar(1,85,40);
if(show_sleds)sled(55,140);
bar(2,55,140);
if(show_sleds)sled(135,140);
bar(3,135,140);
if(show_sleds)sled(225,130);
bar(4,225,130);
if(show_sleds)sled(140,85);
bar(5,140,85);
if(show_sleds)sled(50,85);
bar(6,50,85);
if(show_sleds)sled(140,40);
bar(7,140,40);
// Nominal reverse unlock: lock_state="entry". No secondary keeper designed.
